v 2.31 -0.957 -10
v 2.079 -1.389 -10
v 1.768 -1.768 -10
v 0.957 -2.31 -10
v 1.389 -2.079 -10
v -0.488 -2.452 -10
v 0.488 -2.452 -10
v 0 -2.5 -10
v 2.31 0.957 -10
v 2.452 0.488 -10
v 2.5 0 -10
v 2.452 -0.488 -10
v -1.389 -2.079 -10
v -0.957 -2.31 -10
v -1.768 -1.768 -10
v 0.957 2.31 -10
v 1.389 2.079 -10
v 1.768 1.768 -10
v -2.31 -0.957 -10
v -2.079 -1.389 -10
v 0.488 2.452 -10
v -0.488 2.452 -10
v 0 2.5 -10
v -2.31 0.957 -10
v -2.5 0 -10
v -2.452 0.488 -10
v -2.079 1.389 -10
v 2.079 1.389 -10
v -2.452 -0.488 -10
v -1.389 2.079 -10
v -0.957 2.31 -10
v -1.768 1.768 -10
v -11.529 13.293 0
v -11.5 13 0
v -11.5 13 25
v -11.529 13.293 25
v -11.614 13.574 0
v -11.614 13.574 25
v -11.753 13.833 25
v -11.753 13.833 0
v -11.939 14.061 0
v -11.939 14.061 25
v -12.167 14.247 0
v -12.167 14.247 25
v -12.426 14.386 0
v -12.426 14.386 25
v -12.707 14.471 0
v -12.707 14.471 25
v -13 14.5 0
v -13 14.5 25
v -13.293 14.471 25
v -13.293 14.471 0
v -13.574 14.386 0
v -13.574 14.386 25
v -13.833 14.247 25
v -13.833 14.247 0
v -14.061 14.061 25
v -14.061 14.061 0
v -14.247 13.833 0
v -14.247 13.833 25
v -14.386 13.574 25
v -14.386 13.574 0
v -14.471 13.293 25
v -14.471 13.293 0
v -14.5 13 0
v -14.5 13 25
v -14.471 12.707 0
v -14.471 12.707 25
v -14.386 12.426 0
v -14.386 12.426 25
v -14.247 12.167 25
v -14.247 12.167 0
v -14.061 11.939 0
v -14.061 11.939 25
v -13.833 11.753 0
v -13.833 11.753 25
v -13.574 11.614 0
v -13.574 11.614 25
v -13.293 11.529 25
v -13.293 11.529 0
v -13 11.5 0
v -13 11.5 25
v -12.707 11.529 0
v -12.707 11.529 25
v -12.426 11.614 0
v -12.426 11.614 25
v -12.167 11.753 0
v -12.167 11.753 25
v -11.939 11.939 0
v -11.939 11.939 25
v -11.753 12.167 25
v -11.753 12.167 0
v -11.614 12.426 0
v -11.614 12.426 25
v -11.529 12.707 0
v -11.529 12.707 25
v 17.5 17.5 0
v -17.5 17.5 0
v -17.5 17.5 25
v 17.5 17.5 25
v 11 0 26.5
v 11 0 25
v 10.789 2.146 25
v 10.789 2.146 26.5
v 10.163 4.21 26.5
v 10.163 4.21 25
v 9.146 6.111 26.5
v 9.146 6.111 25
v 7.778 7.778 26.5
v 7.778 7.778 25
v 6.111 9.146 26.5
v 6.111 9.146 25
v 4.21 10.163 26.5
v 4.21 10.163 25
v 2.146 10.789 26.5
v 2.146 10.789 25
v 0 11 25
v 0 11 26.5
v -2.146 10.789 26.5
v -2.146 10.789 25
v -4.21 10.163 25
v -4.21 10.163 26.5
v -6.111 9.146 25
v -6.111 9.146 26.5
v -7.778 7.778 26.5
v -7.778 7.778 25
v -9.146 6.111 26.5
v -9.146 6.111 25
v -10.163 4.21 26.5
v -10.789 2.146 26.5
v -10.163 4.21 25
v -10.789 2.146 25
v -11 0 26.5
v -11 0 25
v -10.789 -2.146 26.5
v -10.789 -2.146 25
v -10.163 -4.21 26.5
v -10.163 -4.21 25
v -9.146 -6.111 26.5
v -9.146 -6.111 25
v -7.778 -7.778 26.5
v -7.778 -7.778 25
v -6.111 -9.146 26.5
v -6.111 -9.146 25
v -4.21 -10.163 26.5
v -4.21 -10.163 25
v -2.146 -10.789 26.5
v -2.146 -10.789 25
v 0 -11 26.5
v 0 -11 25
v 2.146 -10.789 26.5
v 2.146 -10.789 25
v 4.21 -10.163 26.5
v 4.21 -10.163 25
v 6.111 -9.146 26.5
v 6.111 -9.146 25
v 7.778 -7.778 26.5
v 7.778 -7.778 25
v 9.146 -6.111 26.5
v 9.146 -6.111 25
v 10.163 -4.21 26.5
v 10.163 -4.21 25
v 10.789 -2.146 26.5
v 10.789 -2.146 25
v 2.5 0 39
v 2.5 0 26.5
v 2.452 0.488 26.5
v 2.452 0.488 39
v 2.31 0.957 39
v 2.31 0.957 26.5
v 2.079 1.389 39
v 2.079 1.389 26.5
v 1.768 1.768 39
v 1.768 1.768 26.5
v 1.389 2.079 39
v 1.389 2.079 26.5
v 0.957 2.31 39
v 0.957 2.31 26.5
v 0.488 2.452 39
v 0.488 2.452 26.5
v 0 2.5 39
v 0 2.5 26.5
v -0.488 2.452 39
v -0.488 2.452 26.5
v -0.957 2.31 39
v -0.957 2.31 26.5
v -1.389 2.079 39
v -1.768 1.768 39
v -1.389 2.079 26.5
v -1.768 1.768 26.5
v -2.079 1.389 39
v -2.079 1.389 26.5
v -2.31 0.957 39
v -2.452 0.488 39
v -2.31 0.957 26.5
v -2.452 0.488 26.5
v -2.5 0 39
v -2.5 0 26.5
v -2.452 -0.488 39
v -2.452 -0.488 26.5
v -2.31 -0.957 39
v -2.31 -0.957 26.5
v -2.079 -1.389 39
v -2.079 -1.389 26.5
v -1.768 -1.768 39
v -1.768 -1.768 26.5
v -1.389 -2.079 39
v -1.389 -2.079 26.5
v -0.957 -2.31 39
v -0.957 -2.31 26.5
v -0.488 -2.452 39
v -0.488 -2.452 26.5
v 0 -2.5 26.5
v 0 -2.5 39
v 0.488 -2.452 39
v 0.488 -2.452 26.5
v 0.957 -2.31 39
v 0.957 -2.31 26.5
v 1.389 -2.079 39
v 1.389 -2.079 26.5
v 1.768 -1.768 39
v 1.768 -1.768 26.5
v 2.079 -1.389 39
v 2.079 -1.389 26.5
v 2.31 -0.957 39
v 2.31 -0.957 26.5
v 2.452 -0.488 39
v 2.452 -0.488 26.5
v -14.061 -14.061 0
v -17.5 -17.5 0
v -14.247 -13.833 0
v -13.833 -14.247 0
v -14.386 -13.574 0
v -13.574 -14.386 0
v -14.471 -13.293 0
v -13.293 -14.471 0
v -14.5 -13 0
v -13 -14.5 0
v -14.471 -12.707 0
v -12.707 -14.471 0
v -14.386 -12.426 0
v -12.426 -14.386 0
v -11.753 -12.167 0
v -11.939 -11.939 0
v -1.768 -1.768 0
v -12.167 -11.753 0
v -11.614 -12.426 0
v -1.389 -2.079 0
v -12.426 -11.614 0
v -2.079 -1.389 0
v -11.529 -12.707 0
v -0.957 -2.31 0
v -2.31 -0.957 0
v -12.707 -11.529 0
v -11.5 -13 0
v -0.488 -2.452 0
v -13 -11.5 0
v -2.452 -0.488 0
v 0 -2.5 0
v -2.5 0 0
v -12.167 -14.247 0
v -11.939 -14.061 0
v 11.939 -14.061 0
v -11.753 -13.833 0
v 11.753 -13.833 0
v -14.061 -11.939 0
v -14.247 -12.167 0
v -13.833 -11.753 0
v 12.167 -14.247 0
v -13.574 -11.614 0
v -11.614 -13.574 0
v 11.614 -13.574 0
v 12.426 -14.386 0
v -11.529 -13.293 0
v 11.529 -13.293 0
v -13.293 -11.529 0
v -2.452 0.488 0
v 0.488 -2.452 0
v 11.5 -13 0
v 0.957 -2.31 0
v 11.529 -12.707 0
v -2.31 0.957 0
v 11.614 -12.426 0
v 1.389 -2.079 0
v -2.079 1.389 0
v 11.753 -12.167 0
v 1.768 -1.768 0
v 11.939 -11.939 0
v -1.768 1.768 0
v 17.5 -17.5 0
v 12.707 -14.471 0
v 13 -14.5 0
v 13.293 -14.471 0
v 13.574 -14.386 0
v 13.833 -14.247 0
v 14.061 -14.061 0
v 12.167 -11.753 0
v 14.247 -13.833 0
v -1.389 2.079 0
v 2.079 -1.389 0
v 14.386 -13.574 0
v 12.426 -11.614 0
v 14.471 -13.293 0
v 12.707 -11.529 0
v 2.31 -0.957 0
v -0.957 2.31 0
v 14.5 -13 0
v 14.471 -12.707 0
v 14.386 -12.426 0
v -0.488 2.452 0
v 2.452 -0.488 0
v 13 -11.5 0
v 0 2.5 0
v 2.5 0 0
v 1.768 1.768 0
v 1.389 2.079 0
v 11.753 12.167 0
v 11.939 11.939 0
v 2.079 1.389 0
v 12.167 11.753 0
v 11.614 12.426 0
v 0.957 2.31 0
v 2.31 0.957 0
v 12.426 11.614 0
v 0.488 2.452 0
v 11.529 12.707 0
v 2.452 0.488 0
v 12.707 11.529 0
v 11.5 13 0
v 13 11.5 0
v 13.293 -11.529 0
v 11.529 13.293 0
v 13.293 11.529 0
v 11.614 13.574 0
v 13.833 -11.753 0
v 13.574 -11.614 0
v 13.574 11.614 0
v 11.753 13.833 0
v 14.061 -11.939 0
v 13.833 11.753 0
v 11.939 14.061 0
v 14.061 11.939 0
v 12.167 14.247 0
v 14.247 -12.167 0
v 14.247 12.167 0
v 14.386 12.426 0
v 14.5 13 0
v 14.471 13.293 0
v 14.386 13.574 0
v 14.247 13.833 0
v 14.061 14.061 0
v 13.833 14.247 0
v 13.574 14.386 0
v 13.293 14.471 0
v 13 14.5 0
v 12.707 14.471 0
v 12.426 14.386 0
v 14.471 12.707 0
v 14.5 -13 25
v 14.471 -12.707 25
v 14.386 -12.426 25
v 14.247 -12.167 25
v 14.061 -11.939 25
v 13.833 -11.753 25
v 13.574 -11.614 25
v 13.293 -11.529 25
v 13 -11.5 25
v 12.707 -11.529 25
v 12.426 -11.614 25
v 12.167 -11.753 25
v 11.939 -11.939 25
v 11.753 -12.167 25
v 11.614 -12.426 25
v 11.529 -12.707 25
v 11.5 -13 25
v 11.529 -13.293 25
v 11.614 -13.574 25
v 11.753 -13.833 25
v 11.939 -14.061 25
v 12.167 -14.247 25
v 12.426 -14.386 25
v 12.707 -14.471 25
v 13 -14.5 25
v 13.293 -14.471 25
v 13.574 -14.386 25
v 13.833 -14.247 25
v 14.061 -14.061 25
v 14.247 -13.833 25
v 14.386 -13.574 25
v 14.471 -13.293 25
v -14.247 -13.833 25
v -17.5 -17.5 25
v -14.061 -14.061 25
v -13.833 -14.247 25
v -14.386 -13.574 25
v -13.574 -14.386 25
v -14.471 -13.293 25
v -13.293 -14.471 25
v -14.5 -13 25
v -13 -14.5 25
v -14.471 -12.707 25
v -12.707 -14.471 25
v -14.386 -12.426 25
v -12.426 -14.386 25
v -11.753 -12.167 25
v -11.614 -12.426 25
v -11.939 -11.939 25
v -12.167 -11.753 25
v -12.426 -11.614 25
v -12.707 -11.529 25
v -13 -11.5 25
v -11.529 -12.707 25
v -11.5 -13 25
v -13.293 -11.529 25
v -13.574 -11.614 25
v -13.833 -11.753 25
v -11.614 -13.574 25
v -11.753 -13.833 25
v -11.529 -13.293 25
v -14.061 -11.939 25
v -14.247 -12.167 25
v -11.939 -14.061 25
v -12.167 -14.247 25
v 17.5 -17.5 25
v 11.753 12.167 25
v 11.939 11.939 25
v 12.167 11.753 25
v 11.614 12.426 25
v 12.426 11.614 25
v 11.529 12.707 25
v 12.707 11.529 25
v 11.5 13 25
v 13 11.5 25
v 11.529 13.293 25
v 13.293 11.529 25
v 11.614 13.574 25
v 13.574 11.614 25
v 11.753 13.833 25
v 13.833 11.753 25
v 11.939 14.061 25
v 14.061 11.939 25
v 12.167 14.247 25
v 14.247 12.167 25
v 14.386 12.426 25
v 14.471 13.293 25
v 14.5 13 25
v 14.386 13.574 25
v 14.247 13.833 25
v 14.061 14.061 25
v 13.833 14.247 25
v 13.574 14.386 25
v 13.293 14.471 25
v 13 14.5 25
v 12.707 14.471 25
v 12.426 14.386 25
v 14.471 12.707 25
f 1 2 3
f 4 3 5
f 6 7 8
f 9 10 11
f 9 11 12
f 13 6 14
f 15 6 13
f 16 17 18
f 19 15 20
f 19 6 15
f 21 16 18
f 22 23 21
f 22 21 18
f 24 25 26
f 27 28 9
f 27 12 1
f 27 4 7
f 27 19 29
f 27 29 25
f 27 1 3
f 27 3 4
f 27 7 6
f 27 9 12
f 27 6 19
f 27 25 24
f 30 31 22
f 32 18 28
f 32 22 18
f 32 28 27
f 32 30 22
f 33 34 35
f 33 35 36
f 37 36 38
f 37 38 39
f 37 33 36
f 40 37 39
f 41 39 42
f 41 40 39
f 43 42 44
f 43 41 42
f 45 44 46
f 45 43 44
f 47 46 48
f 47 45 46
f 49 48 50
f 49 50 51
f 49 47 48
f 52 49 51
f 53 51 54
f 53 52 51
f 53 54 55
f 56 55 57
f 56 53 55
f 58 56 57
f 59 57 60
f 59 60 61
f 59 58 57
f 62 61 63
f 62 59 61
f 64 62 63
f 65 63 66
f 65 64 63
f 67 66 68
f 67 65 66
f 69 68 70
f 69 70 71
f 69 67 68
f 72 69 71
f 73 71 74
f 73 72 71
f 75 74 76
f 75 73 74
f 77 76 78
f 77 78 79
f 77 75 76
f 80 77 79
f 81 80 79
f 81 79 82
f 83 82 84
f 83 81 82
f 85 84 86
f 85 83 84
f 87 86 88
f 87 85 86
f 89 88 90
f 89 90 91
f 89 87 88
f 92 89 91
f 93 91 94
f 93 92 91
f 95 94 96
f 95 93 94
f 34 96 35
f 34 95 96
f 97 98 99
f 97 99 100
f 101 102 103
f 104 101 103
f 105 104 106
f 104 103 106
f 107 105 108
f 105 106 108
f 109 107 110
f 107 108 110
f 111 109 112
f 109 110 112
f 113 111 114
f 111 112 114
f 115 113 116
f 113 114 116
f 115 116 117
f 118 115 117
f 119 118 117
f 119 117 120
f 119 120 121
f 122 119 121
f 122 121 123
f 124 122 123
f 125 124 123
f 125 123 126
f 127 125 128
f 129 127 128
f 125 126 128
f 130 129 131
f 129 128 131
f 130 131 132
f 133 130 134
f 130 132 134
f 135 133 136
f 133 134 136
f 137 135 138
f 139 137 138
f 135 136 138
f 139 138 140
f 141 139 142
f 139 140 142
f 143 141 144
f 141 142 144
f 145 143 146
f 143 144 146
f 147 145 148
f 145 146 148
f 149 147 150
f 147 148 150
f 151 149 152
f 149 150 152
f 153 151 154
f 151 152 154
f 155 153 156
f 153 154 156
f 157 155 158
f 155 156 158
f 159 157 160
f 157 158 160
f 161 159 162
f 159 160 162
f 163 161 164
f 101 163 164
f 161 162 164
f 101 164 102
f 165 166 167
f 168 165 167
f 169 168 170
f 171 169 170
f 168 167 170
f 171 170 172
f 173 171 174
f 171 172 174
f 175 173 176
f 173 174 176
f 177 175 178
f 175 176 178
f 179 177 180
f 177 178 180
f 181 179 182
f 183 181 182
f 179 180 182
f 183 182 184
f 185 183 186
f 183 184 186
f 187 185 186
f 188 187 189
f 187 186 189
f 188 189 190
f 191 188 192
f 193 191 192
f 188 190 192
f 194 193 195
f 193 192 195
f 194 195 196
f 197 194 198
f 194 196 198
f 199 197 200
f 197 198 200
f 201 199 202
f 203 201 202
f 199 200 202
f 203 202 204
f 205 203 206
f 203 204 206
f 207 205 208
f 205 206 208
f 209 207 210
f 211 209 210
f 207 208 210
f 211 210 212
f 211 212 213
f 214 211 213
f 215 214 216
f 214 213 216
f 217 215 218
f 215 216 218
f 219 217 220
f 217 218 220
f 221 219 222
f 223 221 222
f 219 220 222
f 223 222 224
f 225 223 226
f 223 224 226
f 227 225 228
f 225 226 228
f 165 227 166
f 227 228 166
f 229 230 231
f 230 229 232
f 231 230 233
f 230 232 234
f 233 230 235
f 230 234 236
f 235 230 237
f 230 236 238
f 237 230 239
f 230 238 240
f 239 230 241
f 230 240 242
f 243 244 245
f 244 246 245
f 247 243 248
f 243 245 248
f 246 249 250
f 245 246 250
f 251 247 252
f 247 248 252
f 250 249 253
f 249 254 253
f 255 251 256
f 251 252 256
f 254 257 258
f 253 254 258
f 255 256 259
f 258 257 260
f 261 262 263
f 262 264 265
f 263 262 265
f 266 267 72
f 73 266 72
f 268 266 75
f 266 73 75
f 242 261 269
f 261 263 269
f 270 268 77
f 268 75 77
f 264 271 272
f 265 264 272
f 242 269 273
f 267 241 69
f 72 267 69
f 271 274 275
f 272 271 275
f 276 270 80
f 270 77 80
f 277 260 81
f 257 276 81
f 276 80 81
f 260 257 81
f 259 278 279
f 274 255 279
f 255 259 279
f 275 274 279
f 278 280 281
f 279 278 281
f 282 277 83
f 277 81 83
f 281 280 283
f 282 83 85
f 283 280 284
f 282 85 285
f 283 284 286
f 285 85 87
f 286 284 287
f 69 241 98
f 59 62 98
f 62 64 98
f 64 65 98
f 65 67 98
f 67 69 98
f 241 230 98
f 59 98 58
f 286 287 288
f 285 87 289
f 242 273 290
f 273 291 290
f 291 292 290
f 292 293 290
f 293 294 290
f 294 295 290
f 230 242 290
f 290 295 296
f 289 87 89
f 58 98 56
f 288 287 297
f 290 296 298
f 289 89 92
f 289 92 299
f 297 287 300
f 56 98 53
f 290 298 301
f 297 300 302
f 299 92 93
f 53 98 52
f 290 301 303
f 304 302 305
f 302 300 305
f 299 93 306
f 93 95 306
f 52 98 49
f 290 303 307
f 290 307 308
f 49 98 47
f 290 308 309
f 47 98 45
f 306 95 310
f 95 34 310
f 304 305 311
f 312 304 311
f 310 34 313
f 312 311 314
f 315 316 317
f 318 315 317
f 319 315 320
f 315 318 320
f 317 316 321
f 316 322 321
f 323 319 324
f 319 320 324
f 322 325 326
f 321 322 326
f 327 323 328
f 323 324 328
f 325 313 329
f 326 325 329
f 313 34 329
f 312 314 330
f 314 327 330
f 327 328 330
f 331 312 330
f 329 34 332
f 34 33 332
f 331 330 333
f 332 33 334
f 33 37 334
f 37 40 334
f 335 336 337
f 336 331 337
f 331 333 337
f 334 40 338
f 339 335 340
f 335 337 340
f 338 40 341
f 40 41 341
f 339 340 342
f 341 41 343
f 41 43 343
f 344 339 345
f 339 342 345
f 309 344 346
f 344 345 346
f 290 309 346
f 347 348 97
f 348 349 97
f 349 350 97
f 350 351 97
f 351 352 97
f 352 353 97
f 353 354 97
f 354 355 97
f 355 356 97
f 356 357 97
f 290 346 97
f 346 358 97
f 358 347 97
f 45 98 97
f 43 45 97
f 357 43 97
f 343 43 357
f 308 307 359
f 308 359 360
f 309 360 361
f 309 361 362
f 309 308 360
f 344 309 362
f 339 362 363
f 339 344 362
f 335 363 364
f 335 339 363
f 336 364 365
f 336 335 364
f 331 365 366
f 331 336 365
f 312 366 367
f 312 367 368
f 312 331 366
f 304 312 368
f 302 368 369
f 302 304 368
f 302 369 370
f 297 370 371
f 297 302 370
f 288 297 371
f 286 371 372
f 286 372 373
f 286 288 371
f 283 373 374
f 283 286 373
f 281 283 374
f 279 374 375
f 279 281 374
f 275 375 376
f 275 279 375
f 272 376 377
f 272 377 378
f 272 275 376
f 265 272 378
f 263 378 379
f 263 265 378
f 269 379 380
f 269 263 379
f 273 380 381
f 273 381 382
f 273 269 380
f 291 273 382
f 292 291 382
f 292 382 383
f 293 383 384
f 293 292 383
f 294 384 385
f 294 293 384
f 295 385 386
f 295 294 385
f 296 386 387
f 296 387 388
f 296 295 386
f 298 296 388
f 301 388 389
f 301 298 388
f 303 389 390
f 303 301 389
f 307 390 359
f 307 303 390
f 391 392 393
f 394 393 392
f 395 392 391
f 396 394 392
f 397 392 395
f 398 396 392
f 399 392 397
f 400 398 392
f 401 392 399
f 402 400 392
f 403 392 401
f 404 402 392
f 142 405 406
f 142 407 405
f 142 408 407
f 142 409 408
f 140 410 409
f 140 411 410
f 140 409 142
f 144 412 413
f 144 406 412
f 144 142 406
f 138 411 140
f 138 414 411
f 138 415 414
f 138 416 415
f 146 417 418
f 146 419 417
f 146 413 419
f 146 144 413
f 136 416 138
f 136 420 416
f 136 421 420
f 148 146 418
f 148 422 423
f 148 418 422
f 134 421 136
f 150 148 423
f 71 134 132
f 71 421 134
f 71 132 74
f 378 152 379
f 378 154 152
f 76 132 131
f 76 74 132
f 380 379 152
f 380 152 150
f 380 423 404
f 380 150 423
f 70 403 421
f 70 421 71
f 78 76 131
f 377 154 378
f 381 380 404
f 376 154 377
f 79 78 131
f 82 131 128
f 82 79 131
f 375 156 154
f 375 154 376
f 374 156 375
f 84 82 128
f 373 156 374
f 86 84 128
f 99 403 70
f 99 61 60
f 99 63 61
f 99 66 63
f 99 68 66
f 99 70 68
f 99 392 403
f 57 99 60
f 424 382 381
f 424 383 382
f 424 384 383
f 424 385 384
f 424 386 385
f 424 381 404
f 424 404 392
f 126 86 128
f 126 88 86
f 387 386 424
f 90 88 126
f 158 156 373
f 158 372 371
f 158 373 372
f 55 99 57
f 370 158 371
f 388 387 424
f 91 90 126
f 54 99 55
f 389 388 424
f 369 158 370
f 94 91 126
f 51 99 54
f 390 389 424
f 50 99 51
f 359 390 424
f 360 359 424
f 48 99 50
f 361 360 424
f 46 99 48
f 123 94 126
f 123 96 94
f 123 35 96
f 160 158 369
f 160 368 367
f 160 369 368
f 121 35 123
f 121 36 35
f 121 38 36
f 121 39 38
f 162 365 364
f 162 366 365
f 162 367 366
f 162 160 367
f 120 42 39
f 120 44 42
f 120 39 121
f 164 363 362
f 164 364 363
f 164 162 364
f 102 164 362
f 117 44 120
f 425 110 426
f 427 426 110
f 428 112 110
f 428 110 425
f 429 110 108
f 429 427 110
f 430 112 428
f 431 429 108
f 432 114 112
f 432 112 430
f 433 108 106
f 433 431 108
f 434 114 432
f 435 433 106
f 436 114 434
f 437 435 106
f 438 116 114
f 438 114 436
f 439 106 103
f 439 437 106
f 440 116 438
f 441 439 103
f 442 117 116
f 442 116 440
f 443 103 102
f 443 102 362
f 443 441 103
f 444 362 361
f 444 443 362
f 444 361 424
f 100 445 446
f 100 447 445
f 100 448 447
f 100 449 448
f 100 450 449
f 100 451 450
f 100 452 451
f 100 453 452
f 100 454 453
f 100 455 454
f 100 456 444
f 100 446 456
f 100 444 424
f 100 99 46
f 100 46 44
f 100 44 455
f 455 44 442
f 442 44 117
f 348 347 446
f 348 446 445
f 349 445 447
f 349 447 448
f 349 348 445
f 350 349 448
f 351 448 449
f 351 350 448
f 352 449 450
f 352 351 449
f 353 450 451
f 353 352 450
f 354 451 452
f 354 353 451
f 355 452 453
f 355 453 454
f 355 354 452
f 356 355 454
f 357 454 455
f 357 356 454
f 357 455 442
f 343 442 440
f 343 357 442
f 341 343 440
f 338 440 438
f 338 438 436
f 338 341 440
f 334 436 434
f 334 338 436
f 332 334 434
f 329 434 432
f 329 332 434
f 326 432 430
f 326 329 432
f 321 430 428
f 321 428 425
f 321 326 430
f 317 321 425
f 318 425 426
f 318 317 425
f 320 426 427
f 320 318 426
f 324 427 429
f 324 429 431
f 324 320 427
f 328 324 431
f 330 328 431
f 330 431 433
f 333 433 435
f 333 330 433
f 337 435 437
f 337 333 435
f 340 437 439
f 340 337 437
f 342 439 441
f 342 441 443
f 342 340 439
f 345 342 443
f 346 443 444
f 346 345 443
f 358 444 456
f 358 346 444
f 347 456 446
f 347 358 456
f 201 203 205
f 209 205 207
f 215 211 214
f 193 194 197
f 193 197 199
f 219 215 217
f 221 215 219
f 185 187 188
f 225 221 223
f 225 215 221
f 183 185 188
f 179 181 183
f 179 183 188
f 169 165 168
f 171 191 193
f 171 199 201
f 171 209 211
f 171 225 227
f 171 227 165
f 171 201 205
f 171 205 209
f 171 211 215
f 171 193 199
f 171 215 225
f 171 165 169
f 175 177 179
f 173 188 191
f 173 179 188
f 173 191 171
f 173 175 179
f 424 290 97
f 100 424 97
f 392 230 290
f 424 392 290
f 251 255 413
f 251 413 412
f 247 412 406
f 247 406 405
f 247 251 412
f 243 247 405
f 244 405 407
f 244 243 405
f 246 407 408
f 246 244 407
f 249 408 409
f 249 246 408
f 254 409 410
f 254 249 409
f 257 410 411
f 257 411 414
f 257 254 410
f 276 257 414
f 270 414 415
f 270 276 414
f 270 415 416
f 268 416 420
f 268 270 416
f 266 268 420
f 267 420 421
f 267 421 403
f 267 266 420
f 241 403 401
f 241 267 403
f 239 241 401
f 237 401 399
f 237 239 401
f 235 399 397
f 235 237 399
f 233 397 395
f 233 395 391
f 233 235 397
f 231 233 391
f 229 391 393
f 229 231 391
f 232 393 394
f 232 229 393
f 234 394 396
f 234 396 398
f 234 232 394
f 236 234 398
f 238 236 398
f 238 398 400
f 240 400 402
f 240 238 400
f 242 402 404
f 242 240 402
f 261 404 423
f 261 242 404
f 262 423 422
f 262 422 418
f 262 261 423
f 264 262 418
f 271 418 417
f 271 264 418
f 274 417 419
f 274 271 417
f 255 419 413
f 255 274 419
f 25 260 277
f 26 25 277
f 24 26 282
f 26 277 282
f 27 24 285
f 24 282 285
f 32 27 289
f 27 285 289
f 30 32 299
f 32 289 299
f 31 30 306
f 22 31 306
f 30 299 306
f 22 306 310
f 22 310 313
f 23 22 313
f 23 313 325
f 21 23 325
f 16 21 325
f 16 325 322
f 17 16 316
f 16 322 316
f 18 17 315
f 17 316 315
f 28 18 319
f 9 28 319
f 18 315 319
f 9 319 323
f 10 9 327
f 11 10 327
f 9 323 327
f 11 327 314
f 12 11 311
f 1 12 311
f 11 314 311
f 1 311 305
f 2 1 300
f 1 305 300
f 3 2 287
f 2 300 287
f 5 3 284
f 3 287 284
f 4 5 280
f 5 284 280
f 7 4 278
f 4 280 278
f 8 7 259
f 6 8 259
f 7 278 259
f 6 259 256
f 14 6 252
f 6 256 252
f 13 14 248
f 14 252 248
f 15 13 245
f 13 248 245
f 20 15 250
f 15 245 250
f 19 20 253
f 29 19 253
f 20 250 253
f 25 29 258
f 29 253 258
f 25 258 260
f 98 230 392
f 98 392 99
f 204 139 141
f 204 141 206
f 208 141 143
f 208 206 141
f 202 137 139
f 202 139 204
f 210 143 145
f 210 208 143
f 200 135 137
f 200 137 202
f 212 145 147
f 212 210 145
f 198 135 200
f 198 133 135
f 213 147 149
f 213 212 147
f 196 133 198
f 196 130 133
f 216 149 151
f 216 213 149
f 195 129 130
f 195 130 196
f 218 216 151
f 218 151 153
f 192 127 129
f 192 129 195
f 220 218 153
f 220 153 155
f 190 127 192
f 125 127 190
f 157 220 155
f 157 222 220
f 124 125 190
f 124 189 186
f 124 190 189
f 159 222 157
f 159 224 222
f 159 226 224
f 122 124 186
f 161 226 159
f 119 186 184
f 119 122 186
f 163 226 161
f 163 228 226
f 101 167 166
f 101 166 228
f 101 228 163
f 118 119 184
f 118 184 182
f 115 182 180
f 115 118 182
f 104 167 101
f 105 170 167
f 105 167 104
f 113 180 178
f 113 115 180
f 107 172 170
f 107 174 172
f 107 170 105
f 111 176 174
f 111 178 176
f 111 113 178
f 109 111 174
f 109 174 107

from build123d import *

# Parameters (mm, degrees)
SKETCH1_W           = 35
SKETCH1_H           = 35
SKETCH1_R           = 1.5
BOSS_EXTRUDE1_DEPTH = 25
SKETCH2_R           = 11
BOSS_EXTRUDE2_DEPTH = 1.5
SKETCH3_R           = 2.5
BOSS_EXTRUDE3_DEPTH = 12.5
SKETCH4_R           = 2.5
BOSS_EXTRUDE4_DEPTH = 10


with BuildPart() as part:
    # Sketch1 → Boss-Extrude1 (new body)
    with BuildSketch(Plane.XY):
        Rectangle(SKETCH1_W, SKETCH1_H)
        with Locations((-13, 13)):
            Circle(SKETCH1_R, mode=Mode.SUBTRACT)
        with Locations((13, 13)):
            Circle(SKETCH1_R, mode=Mode.SUBTRACT)
        with Locations((-13, -13)):
            Circle(SKETCH1_R, mode=Mode.SUBTRACT)
        with Locations((13, -13)):
            Circle(SKETCH1_R, mode=Mode.SUBTRACT)
    extrude(amount=BOSS_EXTRUDE1_DEPTH)

    # Sketch2 → Boss-Extrude2 (add)
    with BuildSketch(Plane.XY.offset(25)):
        Circle(SKETCH2_R)
    extrude(amount=BOSS_EXTRUDE2_DEPTH)

    # Sketch3 → Boss-Extrude3 (add)
    with BuildSketch(Plane.XY.offset(26.5)):
        Circle(SKETCH3_R)
    extrude(amount=BOSS_EXTRUDE3_DEPTH)

    # Sketch4 → Boss-Extrude4 (add)
    with BuildSketch(Plane(origin=(0, 0, 0), x_dir=(-1, 0, 0), z_dir=(0, 0, -1))):
        Circle(SKETCH4_R)
    extrude(amount=BOSS_EXTRUDE4_DEPTH)


solid = part.part
